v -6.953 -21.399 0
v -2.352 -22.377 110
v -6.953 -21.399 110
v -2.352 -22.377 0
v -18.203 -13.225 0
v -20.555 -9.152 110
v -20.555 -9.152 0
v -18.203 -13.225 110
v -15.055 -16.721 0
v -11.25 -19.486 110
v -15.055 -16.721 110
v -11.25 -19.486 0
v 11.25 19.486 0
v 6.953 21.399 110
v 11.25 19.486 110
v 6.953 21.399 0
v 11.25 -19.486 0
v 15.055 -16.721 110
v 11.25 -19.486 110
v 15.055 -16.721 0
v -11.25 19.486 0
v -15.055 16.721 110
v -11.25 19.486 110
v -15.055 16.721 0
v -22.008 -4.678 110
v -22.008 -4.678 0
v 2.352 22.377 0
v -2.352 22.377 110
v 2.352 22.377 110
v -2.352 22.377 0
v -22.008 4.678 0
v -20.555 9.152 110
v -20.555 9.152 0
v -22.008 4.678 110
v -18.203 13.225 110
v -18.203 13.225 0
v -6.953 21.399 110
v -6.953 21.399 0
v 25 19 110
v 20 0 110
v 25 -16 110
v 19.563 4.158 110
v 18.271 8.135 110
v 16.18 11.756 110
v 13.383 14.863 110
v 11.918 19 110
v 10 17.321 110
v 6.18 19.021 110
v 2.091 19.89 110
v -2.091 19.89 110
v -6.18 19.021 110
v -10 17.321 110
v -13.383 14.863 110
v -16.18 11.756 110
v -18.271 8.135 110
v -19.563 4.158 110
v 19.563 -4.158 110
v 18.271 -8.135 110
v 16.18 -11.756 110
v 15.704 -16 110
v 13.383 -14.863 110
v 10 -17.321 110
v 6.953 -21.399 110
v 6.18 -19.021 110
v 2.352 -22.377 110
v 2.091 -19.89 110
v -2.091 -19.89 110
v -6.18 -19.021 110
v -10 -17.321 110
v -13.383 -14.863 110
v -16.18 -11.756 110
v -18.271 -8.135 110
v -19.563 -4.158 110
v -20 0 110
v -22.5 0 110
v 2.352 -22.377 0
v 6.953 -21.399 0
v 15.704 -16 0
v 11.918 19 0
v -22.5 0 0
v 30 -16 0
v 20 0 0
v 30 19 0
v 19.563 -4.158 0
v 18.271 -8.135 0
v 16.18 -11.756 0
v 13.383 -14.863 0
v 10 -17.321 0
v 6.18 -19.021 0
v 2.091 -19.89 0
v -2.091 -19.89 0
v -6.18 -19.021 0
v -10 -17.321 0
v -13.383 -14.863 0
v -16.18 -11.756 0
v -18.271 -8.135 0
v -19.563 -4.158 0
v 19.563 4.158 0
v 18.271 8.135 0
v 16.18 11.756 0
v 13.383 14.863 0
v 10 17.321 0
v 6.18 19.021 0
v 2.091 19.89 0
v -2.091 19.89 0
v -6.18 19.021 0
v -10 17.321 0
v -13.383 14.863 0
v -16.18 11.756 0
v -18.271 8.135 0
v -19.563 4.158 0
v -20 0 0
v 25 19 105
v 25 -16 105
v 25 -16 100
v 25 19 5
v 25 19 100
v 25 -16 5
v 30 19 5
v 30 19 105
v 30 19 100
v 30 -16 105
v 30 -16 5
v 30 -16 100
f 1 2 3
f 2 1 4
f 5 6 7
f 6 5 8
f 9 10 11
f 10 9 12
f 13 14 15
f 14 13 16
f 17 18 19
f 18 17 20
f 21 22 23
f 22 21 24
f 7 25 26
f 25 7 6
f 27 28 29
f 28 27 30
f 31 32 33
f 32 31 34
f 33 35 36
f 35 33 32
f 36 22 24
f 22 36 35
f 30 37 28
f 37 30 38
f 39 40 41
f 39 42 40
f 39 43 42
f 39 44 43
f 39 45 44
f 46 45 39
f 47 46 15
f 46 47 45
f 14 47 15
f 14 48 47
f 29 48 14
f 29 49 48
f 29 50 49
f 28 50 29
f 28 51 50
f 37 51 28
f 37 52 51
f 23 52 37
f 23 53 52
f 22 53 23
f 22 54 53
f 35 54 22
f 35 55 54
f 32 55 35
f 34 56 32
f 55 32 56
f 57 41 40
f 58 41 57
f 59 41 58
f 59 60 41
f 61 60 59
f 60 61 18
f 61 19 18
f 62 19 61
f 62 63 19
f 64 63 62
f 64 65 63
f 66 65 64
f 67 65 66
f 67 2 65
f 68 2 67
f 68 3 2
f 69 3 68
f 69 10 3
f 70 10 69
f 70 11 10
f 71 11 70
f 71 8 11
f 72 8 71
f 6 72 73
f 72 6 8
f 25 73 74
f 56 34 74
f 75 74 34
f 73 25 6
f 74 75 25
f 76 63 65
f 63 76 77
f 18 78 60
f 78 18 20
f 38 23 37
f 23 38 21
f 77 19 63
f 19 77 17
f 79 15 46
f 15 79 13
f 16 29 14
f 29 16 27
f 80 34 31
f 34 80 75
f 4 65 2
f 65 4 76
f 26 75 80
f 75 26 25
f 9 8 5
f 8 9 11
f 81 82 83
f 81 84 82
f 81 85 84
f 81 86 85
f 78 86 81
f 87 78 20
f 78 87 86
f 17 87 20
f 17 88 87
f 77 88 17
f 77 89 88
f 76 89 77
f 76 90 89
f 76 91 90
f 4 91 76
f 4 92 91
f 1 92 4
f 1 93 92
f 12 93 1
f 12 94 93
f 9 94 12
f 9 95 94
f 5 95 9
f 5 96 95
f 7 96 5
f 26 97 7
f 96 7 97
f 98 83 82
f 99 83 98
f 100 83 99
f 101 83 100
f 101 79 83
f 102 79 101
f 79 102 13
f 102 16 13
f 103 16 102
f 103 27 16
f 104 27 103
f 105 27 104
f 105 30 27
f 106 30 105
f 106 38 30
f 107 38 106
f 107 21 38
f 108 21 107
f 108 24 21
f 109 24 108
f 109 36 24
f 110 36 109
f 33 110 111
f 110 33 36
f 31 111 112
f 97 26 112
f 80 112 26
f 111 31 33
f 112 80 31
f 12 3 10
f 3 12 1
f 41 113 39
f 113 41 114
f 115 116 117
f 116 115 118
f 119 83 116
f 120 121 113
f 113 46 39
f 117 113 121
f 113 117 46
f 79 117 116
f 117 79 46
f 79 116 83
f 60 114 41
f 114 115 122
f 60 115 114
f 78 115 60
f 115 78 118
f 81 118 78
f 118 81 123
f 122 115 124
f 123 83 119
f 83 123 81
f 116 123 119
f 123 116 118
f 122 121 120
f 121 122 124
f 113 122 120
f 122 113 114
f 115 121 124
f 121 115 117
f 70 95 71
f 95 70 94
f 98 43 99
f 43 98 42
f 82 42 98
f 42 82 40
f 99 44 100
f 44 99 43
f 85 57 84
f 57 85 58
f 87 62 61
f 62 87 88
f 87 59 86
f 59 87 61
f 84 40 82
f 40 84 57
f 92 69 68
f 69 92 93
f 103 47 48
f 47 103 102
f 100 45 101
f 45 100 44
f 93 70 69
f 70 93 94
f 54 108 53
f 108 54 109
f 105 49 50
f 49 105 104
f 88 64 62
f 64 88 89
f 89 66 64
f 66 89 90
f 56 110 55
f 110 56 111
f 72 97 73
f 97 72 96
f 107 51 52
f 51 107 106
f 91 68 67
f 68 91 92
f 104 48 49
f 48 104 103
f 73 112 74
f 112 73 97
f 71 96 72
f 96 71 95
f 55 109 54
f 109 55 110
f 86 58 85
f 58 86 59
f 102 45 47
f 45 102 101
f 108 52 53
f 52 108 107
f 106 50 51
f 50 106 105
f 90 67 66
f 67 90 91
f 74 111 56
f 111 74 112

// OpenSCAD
difference() {
  union(){
    cylinder(d1=45, d2=45, h=110);
    translate([5, -16, 0]){
      cube([20, 35, 110]);
    }
    translate([20, -16, 0]){
      cube([10, 35, 5]);
    }
    translate([20, -16, 100]){
      cube([10, 35, 5]);
    }
  }
  cylinder(d1=40, d2=40, h=120);
}
